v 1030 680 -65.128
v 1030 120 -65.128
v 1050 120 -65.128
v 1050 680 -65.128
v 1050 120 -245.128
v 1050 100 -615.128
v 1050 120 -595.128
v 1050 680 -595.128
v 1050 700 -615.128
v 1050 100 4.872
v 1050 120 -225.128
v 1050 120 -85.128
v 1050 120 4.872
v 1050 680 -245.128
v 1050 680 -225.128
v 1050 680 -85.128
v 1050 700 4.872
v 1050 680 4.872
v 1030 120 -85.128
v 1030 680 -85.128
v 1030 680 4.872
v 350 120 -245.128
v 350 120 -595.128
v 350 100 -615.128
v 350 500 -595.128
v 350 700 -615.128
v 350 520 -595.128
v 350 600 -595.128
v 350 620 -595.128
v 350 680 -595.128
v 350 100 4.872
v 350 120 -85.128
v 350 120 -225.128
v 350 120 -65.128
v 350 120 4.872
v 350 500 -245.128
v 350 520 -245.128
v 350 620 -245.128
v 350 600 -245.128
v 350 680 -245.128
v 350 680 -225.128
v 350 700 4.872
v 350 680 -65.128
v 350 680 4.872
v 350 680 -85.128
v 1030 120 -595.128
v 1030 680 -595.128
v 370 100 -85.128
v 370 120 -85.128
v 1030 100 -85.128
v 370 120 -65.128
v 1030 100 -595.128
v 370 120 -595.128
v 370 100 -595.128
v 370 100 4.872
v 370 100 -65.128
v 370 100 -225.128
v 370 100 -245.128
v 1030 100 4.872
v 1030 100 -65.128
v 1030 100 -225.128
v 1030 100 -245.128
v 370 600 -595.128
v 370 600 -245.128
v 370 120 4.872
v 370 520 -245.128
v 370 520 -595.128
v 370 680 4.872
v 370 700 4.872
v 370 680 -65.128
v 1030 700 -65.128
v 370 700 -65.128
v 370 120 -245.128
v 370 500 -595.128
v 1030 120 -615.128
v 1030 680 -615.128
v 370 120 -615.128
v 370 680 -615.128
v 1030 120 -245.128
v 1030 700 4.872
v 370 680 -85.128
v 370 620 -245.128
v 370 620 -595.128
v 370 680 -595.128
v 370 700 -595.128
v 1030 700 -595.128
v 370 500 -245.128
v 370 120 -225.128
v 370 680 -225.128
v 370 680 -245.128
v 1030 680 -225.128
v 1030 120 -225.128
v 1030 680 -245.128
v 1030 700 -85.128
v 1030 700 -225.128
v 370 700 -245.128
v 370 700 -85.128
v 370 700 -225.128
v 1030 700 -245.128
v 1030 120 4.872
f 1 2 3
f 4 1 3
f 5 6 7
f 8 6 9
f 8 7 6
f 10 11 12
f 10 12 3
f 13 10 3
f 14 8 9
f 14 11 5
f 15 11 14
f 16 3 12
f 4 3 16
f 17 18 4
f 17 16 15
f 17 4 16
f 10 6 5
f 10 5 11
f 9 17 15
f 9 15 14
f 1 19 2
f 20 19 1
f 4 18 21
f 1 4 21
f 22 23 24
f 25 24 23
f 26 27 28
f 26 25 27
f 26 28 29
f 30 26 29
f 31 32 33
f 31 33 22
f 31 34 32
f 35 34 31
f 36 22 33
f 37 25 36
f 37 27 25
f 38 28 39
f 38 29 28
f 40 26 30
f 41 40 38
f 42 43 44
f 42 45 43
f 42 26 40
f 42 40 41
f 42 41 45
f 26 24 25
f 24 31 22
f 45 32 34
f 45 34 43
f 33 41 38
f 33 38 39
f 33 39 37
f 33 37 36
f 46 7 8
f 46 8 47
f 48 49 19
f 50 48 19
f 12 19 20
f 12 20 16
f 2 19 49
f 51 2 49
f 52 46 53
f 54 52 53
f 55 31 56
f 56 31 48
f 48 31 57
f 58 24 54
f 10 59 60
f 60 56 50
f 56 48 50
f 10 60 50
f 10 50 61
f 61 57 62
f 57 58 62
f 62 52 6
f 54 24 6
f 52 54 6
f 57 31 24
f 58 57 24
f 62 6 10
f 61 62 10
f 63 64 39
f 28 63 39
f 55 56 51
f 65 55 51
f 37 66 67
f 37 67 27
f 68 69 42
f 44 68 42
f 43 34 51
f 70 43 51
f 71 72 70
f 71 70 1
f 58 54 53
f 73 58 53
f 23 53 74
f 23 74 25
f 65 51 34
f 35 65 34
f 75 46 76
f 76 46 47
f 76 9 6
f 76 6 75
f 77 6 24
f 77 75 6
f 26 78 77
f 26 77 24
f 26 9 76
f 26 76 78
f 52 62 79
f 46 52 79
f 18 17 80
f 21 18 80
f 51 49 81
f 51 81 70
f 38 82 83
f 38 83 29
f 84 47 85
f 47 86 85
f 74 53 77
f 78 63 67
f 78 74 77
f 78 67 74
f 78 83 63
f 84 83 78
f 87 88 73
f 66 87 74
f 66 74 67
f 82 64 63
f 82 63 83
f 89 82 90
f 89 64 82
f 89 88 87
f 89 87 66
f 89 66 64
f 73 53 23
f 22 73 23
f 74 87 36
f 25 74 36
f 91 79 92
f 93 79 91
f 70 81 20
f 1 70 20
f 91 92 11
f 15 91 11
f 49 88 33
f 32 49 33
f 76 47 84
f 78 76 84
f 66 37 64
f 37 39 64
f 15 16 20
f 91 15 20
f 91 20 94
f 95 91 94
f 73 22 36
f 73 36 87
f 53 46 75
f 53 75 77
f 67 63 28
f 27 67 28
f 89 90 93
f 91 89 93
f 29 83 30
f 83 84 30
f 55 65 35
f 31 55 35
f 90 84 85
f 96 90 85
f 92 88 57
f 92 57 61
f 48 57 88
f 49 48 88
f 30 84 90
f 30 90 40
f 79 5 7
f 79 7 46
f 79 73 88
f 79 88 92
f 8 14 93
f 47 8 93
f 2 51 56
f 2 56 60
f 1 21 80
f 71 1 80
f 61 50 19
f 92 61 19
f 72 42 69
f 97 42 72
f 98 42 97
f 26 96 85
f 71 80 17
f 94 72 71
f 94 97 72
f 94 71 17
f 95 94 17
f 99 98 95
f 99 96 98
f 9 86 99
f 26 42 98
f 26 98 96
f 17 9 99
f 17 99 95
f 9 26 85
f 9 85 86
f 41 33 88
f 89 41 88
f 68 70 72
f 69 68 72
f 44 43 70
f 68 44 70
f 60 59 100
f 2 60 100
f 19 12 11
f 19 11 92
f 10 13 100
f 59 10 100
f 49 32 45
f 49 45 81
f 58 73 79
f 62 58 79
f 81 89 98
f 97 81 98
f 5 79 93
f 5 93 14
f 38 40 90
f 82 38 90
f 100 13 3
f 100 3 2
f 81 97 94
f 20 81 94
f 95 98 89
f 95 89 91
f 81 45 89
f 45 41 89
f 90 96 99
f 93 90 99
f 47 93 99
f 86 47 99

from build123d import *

# Parameters (mm, degrees)
SKETCH8_W             = 20
SKETCH8_H             = 20
BOSS_EXTRUDE5_DEPTH   = 600
BOSS_EXTRUDE5_2_DEPTH = 600
SKETCH10_W            = 900
SKETCH10_H            = 600
SKETCH10_W_2          = 860
SKETCH10_H_2          = 560
BOSS_EXTRUDE6_DEPTH   = 20
SKETCH12_W            = 900
SKETCH12_H            = 600
SKETCH12_W_2          = 860
SKETCH12_H_2          = 560
BOSS_EXTRUDE7_DEPTH   = 20
SKETCH13_W            = 20
SKETCH13_H            = 560
BOSS_EXTRUDE8_DEPTH   = 20
SKETCH14_W            = 20
SKETCH14_H            = 20
BOSS_EXTRUDE9_DEPTH   = 350
SKETCH16_W            = 900
SKETCH16_H            = 600
SKETCH16_W_2          = 860
SKETCH16_H_2          = 560
BOSS_EXTRUDE10_DEPTH  = 20
SKETCH17_W            = 200
SKETCH17_H            = 620
CUT_EXTRUDE1_DEPTH    = 601
SKETCH18_W            = 20
SKETCH18_H            = 20
BOSS_EXTRUDE11_DEPTH  = 620
SKETCH19_W            = 20
SKETCH19_H            = 20
BOSS_EXTRUDE12_DEPTH  = 560


with BuildPart() as part:
    # Sketch8 → Boss-Extrude5 (new body)
    with BuildSketch(Plane(origin=(0, 0, 4.872076023), x_dir=(-1, 0, 0), z_dir=(0, 0, -1))):
        with Locations((-1040, 690)):
            Rectangle(SKETCH8_W, SKETCH8_H)
    extrude(amount=BOSS_EXTRUDE5_DEPTH)



with BuildPart() as body_2:
    # Sketch8 → Boss-Extrude5 2 (new body)
    with BuildSketch(Plane(origin=(0, 0, 4.872076023), x_dir=(-1, 0, 0), z_dir=(0, 0, -1))):
        with Locations((-1040, 110)):
            Rectangle(SKETCH8_W, SKETCH8_H)
    extrude(amount=BOSS_EXTRUDE5_2_DEPTH)


with BuildPart() as part_1:
    add(part.part)

    add(body_2.part)  # Boss-Extrude6 merges body 2
    # Sketch10 → Boss-Extrude6 (add)
    with BuildSketch(Plane(origin=(0, 0, -595.127923977), x_dir=(-1, 0, 0), z_dir=(0, 0, -1))):
        with Locations((-600, 400)):
            Rectangle(SKETCH10_W, SKETCH10_H)
        with Locations((-600, 400)):
            Rectangle(SKETCH10_W_2, SKETCH10_H_2, mode=Mode.SUBTRACT)
    extrude(amount=BOSS_EXTRUDE6_DEPTH)

    # Sketch12 → Boss-Extrude7 (add)
    with BuildSketch(Plane.XY.offset(-245.127923977)):
        with Locations((600, 400)):
            Rectangle(SKETCH12_W, SKETCH12_H)
        with Locations((600, 400)):
            Rectangle(SKETCH12_W_2, SKETCH12_H_2, mode=Mode.SUBTRACT)
    extrude(amount=BOSS_EXTRUDE7_DEPTH)

    # Sketch13 → Boss-Extrude8 (add)
    with BuildSketch(Plane(origin=(0, 0, -615.127923977), x_dir=(-1, 0, 0), z_dir=(0, 0, -1))):
        with Locations((-360, 400)):
            Rectangle(SKETCH13_W, SKETCH13_H)
    boss_extrude8 = extrude(amount=-BOSS_EXTRUDE8_DEPTH)

    # Mirror1: Boss-Extrude8 across plane
    add(boss_extrude8.mirror(Plane(origin=(0, 0, -420.127923977), x_dir=(1, 0, 0), z_dir=(0, 0, -1))))

    # Sketch14 → Boss-Extrude9 (add)
    with BuildSketch(Plane(origin=(0, 0, -245.127923977), x_dir=(-1, 0, 0), z_dir=(0, 0, -1))):
        with Locations((-360, 610)):
            Rectangle(SKETCH14_W, SKETCH14_H)
    boss_extrude9 = extrude(amount=BOSS_EXTRUDE9_DEPTH)

    # Mirror2: Boss-Extrude9 across plane
    add(boss_extrude9.mirror(Plane(origin=(0, 560, 0), x_dir=(0, 0, 1), z_dir=(0, -1, 0))))

    # Sketch16 → Boss-Extrude10 (add)
    with BuildSketch(Plane.XY.offset(-85.127923977)):
        with Locations((600, 400)):
            Rectangle(SKETCH16_W, SKETCH16_H)
        with Locations((600, 400)):
            Rectangle(SKETCH16_W_2, SKETCH16_H_2, mode=Mode.SUBTRACT)
    extrude(amount=BOSS_EXTRUDE10_DEPTH)

    # Sketch17 → Cut-Extrude1 (cut, through all)
    with BuildSketch(Plane(origin=(0, 700, 0), x_dir=(1, 0, 0), z_dir=(0, 1, 0))):
        with Locations((250, 305.127923977)):
            Rectangle(SKETCH17_W, SKETCH17_H)
    extrude(amount=-CUT_EXTRUDE1_DEPTH, mode=Mode.SUBTRACT)

    # Sketch18 → Boss-Extrude11 (add)
    with BuildSketch(Plane(origin=(0, 0, -615.127923977), x_dir=(-1, 0, 0), z_dir=(0, 0, -1))):
        with Locations((-360, 690)):
            Rectangle(SKETCH18_W, SKETCH18_H)
        with Locations((-360, 110)):
            Rectangle(SKETCH18_W, SKETCH18_H)
    extrude(amount=-BOSS_EXTRUDE11_DEPTH)

    # Sketch19 → Boss-Extrude12 (add)
    with BuildSketch(Plane.XZ.offset(-680)):
        with Locations((360, -75.127923977)):
            Rectangle(SKETCH19_W, SKETCH19_H)
    extrude(amount=BOSS_EXTRUDE12_DEPTH)


solid = part_1.part
